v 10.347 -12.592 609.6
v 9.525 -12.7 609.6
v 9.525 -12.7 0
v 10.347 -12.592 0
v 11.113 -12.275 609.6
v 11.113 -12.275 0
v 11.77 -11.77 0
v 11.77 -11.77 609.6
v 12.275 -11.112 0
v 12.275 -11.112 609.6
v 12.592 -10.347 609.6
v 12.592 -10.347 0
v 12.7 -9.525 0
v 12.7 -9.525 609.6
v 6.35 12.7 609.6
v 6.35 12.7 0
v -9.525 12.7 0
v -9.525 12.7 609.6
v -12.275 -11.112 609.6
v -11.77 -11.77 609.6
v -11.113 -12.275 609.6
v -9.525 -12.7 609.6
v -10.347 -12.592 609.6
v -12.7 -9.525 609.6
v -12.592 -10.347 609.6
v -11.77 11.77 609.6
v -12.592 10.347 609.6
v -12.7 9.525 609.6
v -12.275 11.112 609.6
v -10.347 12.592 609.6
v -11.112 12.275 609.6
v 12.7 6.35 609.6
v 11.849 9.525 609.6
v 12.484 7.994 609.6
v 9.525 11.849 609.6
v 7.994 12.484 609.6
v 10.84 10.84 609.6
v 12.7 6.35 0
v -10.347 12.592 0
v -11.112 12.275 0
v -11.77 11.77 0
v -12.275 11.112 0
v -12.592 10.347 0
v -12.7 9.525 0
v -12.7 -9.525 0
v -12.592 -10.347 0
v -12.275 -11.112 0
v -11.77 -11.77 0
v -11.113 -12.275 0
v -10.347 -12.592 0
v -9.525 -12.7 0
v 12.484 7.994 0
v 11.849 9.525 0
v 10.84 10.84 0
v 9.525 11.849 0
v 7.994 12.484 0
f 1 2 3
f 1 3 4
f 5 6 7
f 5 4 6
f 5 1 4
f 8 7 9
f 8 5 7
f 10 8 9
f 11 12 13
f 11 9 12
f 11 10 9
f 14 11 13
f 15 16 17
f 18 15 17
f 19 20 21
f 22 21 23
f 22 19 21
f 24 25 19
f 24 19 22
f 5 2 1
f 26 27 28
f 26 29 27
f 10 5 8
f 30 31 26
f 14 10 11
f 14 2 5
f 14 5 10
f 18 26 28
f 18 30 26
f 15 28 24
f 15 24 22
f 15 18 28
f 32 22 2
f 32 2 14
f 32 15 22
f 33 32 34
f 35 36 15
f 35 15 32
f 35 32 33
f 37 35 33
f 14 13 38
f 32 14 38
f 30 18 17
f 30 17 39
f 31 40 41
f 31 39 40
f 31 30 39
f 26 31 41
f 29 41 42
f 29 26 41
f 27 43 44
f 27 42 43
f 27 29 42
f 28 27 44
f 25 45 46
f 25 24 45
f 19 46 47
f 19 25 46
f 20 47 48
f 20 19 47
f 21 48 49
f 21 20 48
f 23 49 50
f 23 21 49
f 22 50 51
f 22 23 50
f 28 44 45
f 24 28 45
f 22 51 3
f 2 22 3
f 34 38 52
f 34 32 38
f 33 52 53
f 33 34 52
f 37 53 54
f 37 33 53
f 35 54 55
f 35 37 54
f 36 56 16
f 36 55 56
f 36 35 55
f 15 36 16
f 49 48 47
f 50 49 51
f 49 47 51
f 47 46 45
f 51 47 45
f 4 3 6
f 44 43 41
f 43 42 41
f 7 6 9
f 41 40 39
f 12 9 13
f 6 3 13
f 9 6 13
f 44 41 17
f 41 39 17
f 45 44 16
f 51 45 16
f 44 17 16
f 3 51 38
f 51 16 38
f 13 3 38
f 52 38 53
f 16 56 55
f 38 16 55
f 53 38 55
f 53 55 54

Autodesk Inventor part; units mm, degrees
ref_plane "YZ Plane" through (0, 0, 0) normal (1, 0, 0) x (0, 1, 0)
ref_plane "XZ Plane" through (0, 0, 0) normal (0, 1, 0) x (-1, 0, 0)
ref_plane "XY Plane" through (0, 0, 0) normal (0, 0, 1) x (1, 0, 0)
sketch "Sketch1" plane through (0, 0, 0) normal (0, 0, 1) x (1, 0, 0)
  line L0 (-12.7, -12.7) -> (12.7, -12.7)
  line L1 (12.7, -12.7) -> (12.7, 12.7)
  line L2 (12.7, 12.7) -> (-12.7, 12.7)
  line L3 (-12.7, 12.7) -> (-12.7, -12.7)
  line L4 (-12.7, -12.7) -> (12.7, 12.7) construction
  line L5 (12.7, -12.7) -> (-12.7, 12.7) construction
  point P0 (0, 0)
  dimension "d0" = 25.4
  dimension "d1" = 25.4
extrude "Extrusion1" add sketch "Sketch1" along normal blind 609.6
fillet "Fillet1" radius 3.175 3 edges at (-12.7, -12.7, 304.8) (-12.7, 12.7, 304.8) (12.7, -12.7, 304.8)
fillet "Fillet2" radius 6.35 1 edges at (12.7, 12.7, 304.8)
properties part number "Lower Alignment"
